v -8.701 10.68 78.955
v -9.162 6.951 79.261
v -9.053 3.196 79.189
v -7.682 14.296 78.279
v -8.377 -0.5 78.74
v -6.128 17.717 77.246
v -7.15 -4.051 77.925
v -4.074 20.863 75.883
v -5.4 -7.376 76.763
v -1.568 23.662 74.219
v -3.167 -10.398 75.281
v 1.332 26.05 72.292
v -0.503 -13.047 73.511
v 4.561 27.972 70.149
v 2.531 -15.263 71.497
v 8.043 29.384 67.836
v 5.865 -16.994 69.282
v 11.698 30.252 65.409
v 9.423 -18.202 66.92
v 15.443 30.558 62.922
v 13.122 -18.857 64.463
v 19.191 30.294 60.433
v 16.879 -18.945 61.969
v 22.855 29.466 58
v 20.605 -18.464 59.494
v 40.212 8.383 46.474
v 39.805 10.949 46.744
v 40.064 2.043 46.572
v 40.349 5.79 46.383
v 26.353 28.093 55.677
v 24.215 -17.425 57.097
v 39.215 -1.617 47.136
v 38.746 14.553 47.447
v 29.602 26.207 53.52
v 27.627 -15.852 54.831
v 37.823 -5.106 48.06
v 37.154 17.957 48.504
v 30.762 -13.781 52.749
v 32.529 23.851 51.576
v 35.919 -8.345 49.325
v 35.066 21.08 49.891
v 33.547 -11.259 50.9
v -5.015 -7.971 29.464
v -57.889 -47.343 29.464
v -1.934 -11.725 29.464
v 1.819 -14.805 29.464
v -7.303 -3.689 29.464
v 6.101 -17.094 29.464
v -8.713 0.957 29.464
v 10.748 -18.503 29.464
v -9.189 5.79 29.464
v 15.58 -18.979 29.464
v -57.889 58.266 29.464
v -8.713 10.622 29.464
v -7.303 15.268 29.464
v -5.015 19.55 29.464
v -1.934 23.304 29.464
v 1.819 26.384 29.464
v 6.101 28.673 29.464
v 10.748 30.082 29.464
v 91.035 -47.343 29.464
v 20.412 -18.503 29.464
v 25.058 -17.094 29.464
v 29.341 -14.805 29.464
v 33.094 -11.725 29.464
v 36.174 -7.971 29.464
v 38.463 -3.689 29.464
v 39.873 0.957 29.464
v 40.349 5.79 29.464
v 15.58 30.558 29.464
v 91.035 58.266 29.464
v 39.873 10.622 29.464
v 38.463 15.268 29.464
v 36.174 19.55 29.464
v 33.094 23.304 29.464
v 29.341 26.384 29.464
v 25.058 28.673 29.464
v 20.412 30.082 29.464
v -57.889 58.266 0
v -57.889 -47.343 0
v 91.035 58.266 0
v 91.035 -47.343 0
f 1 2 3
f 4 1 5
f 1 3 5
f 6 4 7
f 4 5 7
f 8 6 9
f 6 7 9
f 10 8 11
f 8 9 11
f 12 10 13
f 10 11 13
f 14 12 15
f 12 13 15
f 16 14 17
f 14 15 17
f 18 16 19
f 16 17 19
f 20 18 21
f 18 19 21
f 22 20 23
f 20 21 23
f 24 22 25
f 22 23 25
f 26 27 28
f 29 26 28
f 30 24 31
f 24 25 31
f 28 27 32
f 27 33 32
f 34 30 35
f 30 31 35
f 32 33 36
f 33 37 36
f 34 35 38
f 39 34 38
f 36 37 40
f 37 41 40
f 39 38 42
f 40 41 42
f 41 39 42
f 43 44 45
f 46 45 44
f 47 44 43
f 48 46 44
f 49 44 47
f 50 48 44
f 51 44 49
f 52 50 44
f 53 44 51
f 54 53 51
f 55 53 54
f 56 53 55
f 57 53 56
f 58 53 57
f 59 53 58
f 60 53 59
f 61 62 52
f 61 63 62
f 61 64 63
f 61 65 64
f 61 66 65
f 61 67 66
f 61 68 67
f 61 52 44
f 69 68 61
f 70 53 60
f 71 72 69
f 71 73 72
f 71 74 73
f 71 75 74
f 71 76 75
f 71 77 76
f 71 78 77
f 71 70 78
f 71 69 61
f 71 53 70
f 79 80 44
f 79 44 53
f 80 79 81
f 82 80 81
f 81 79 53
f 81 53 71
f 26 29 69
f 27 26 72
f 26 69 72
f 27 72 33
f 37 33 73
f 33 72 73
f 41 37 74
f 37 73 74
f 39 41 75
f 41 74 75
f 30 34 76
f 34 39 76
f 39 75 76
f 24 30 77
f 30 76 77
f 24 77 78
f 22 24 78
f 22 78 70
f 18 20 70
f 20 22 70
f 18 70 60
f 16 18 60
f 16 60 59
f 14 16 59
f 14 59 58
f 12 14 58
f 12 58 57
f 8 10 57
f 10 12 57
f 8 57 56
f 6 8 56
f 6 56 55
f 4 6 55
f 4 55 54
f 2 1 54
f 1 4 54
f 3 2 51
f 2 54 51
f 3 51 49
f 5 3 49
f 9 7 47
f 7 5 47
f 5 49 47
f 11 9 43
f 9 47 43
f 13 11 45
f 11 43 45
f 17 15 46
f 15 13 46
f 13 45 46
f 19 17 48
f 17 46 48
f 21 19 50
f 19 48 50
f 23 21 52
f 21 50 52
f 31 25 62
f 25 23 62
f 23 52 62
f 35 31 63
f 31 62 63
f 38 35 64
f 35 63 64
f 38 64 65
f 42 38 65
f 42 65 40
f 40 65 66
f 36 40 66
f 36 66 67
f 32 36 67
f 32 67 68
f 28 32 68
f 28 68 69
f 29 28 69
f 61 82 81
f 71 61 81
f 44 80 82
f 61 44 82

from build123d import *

# Parameters (mm, degrees)
F0_W     = 148.923736
F0_H     = 105.609175
F1_DEPTH = 29.464
F2_R     = 24.768688
F3_DEPTH = 51.308
F5_DEPTH = 1143


with BuildPart() as f1:
    # F0 (on Top) → F1 (new body)
    with BuildSketch(Plane.XY):
        with Locations((16.5732, 5.461818)):
            Rectangle(F0_W, F0_H)
    extrude(amount=F1_DEPTH)

    # F2 (on face) → F3 (join)
    with BuildSketch(Plane.XY.offset(29.464)):
        with Locations((15.579882, 5.789573)):
            Circle(F2_R)
    extrude(amount=F3_DEPTH)

    # F4 (on Front) → F5 (cut, symmetric)
    with BuildSketch(Plane.XZ):
        Polygon((40.655378, 84.109753), (-16.463115, 84.109753), (40.655378, 46.179499), align=None)
    extrude(amount=F5_DEPTH, both=True, mode=Mode.SUBTRACT)


solid = f1.part
